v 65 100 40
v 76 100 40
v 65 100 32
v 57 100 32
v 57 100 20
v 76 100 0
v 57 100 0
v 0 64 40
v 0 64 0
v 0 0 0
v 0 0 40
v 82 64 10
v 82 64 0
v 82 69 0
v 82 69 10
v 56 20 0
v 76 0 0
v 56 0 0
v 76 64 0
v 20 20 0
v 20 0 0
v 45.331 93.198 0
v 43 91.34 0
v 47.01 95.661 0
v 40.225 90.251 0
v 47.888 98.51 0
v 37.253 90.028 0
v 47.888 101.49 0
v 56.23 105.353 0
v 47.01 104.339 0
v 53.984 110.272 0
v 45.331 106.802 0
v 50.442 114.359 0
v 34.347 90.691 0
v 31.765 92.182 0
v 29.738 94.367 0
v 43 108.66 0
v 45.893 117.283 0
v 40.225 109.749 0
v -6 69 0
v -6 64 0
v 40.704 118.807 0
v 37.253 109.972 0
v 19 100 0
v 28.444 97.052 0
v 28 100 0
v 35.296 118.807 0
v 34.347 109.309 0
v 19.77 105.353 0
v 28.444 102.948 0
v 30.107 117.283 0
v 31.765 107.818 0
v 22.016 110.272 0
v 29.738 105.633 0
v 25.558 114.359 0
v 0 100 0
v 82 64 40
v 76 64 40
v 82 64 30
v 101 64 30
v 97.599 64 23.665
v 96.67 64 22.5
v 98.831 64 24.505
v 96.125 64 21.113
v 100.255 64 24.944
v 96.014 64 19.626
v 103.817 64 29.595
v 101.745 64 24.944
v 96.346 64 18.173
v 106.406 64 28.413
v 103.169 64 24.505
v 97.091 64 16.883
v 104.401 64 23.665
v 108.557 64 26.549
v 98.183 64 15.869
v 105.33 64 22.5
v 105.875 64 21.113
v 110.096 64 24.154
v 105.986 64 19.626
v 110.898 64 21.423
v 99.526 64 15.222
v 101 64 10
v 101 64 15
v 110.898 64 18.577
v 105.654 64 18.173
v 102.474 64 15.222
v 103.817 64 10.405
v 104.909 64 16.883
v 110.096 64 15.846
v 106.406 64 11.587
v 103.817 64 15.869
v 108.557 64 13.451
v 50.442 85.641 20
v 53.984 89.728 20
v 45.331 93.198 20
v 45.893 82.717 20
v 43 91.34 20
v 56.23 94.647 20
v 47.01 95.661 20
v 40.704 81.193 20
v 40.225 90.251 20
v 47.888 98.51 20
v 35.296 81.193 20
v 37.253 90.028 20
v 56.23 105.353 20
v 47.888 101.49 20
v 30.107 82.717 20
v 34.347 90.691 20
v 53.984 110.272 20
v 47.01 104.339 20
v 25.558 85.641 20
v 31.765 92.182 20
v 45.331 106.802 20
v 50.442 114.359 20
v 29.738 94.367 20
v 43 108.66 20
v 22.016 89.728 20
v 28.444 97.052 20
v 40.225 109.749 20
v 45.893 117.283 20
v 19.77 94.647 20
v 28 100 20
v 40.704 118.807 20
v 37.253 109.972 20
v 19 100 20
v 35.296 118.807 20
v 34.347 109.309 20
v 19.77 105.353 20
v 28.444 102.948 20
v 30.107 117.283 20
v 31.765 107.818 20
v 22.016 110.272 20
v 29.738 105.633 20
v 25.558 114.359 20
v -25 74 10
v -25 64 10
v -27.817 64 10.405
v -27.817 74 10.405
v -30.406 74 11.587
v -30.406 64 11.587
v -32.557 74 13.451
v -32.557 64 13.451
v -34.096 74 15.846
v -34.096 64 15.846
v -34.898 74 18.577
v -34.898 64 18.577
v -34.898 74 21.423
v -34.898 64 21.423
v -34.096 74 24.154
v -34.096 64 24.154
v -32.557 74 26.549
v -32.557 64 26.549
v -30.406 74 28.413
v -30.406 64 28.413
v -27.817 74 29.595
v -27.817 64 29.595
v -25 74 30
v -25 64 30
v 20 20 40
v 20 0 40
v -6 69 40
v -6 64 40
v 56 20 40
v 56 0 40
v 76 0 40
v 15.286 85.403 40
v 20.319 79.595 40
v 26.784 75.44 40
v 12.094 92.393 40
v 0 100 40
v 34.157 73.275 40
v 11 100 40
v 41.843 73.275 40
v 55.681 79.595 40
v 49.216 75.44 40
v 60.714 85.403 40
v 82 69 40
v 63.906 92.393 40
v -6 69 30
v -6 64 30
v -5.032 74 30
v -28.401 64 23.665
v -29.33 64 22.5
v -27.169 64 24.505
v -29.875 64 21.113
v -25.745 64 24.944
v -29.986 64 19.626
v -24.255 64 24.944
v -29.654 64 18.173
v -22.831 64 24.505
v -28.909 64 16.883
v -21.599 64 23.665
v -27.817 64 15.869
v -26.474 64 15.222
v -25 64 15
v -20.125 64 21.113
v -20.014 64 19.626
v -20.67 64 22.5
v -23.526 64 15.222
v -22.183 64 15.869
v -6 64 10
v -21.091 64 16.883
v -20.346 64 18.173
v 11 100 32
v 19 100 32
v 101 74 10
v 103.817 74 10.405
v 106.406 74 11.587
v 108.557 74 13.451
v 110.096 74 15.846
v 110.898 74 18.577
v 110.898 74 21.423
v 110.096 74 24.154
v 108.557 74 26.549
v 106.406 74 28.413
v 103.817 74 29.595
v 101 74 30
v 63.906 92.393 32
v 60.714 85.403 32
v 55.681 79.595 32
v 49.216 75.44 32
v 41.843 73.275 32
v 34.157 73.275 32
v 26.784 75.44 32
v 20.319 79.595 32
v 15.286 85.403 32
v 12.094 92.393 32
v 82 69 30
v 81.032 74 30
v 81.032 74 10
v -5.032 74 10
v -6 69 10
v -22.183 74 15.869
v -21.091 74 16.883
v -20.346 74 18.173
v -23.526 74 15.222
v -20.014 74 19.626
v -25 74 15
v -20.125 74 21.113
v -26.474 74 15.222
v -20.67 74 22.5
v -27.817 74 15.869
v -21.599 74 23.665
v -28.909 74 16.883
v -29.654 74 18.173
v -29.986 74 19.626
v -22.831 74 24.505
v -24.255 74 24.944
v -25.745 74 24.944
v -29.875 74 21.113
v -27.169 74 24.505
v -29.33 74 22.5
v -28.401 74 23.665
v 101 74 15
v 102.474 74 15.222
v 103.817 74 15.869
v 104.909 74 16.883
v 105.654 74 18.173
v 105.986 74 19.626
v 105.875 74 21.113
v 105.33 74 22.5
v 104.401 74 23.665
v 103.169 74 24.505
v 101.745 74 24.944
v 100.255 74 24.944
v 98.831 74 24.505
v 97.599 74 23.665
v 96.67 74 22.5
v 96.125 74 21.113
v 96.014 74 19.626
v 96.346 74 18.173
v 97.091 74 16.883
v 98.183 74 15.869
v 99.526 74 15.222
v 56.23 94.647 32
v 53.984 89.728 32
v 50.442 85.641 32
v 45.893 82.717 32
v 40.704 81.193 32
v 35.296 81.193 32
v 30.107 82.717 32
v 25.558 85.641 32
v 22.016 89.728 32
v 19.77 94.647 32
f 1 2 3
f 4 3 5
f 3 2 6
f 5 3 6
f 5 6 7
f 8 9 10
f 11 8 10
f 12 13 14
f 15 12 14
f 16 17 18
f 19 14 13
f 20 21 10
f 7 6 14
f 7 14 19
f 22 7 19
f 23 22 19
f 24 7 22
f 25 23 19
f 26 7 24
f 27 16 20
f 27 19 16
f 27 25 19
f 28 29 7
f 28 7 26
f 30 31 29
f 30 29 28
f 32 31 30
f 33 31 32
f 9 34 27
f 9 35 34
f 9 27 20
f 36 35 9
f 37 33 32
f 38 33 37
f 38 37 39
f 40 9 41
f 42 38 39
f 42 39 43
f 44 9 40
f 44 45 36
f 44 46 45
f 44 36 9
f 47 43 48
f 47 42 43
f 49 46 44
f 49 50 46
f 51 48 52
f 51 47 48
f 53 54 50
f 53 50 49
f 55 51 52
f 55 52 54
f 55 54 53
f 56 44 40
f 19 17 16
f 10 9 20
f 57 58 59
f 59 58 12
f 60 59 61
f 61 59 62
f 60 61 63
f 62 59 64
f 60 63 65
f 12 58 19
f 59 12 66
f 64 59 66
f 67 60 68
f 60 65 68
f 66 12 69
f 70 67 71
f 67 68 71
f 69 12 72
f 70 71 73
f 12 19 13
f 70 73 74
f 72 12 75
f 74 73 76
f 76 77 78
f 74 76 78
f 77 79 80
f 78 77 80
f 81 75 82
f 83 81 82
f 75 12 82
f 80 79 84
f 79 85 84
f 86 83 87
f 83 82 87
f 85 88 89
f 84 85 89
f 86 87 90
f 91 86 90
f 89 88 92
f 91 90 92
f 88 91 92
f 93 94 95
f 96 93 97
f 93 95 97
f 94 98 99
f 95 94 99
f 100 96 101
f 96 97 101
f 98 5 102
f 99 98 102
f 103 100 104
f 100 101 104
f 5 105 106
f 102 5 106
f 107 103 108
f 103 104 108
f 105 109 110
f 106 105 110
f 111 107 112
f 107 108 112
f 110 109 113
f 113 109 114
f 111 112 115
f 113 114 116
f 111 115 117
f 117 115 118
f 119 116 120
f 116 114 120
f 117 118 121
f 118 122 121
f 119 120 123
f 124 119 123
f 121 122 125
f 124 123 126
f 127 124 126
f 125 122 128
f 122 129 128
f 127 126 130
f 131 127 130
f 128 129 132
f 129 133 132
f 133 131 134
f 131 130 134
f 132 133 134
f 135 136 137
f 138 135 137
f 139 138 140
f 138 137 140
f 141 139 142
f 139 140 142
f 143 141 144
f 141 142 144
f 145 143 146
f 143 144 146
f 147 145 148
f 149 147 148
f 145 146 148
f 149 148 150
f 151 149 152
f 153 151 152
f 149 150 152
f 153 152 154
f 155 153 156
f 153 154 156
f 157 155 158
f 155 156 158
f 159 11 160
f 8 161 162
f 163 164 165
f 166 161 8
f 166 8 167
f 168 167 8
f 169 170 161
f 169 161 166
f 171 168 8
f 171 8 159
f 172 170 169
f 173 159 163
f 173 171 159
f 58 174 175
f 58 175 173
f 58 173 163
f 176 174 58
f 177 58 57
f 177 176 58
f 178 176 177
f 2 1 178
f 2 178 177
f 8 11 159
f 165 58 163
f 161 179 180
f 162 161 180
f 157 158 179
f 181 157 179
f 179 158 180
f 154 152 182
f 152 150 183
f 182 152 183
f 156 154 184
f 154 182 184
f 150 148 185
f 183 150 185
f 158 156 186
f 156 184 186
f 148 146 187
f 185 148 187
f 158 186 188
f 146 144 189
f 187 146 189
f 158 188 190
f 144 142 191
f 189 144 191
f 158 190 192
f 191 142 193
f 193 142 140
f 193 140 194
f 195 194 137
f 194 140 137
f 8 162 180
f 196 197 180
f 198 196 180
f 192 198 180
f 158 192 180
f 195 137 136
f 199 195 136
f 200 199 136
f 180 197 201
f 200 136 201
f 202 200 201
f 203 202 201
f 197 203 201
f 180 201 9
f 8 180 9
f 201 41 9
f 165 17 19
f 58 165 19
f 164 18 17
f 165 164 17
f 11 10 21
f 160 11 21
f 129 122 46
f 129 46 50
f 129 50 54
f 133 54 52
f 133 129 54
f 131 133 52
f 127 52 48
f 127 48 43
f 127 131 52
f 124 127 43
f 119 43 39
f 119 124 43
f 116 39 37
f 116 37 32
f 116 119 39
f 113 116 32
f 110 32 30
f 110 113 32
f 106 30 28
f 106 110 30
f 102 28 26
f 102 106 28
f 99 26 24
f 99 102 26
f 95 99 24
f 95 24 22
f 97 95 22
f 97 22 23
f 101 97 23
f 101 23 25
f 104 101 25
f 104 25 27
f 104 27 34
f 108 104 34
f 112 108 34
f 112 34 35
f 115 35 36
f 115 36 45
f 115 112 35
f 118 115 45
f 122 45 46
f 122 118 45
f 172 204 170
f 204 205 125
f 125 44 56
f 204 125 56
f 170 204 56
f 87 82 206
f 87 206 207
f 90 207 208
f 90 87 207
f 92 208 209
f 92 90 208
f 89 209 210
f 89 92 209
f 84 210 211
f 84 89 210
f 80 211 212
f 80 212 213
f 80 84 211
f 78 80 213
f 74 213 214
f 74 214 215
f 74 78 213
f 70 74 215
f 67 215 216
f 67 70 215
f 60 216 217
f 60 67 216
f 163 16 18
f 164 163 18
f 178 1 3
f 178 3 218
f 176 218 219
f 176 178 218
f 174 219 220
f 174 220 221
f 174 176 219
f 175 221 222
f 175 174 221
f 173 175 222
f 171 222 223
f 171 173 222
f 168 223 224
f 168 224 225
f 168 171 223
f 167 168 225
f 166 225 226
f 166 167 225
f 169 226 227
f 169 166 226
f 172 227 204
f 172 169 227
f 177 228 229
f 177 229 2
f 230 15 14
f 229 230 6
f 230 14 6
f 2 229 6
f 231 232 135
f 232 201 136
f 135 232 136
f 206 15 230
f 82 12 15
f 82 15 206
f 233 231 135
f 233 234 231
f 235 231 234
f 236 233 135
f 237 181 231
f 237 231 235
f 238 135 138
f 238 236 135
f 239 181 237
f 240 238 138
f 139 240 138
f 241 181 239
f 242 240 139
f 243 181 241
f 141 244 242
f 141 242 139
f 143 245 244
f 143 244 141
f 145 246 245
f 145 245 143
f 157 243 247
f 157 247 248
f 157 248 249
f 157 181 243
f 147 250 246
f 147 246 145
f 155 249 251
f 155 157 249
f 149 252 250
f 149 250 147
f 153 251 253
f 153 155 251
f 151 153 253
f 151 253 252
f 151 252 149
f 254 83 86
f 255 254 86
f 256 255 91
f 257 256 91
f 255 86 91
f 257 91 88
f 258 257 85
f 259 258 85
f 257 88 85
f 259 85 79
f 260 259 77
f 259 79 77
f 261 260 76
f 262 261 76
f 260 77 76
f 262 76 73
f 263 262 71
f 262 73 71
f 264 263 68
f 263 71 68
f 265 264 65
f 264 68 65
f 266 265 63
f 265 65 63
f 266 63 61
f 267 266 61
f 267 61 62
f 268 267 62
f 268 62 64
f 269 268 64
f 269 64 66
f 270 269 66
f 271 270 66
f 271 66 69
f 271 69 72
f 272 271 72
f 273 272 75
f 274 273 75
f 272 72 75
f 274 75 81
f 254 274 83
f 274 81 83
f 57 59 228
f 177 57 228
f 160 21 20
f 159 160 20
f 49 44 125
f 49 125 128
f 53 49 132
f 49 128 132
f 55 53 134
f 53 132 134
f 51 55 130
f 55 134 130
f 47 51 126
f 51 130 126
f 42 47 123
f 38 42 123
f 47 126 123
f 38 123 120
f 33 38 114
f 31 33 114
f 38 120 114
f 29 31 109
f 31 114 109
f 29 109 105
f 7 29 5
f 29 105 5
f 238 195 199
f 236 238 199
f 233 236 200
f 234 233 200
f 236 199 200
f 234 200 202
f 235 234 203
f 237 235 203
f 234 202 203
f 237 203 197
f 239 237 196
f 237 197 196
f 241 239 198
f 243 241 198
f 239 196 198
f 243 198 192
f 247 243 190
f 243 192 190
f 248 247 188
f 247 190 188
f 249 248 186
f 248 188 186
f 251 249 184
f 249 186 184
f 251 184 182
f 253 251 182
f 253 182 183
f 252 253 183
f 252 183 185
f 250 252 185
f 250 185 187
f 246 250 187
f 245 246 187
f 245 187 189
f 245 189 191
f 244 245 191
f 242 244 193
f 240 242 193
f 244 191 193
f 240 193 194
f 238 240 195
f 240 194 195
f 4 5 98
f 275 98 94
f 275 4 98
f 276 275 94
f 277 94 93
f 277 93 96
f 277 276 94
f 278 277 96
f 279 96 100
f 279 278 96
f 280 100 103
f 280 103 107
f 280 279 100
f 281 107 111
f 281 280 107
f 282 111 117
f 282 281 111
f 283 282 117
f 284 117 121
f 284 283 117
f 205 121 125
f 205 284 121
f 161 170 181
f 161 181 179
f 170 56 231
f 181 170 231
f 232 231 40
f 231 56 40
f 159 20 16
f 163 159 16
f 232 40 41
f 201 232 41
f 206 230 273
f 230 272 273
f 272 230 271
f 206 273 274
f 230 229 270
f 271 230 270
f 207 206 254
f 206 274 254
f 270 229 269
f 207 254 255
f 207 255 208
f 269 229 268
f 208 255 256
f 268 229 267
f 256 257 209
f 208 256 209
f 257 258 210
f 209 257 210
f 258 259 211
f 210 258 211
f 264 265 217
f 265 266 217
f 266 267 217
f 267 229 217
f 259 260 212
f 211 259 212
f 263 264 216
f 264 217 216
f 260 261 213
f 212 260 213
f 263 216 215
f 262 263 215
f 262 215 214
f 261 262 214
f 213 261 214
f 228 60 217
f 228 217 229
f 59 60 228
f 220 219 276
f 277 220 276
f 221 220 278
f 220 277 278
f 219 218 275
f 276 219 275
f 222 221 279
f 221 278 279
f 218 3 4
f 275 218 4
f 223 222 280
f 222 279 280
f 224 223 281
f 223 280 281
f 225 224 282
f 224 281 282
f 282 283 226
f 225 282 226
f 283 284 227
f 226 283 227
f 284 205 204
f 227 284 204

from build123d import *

# Parameters (mm, degrees)
BOSS_EXTRUDE1_DEPTH = 40
CUT_EXTRUDE1_DEPTH  = 8
CUT_EXTRUDE2_DEPTH  = 134.221619867
BOSS_EXTRUDE2_START = -20
SKETCH5_R           = 19
SKETCH5_R_2         = 10
BOSS_EXTRUDE2_DEPTH = 20
SKETCH6_R           = 5
BOSS_EXTRUDE3_DEPTH = 10
SKETCH7_R           = 5
BOSS_EXTRUDE4_DEPTH = 10


with BuildPart() as part:
    # Sketch1 → Boss-Extrude1 (new body)
    with BuildSketch(Plane.XY):
        Polygon((0, 0), (20, 0), (20, 20), (56, 20), (56, 0), (76, 0), (76, 64), (82, 64), (82, 69), (76, 100), (0, 100), (-6, 69), (-6, 64), (0, 64), align=None)
    extrude(amount=BOSS_EXTRUDE1_DEPTH)

    # Sketch2 → Cut-Extrude1 (cut)
    with BuildSketch(Plane.XY.offset(40)):
        with BuildLine():
            Line((11, 100), (65, 100))
            ThreePointArc((65, 100), (38, 73), (11, 100))
        make_face()
    extrude(amount=-CUT_EXTRUDE1_DEPTH, mode=Mode.SUBTRACT)

    # Sketch4 → Cut-Extrude2 (cut, through all)
    with BuildSketch(Plane.XY.offset(32)):
        with BuildLine():
            Line((19, 100), (57, 100))
            ThreePointArc((57, 100), (38, 81), (19, 100))
        make_face()
    extrude(amount=-CUT_EXTRUDE2_DEPTH, mode=Mode.SUBTRACT)

    # Sketch5 → Boss-Extrude2 (add)
    with BuildSketch(Plane(origin=(0, 0, 0), x_dir=(-1, 0, 0), z_dir=(0, 0, -1)).offset(BOSS_EXTRUDE2_START)):
        with Locations((-38, 100)):
            Circle(SKETCH5_R)
        with Locations((-38, 100)):
            Circle(SKETCH5_R_2, mode=Mode.SUBTRACT)
    extrude(amount=BOSS_EXTRUDE2_DEPTH)

    # Sketch6 → Boss-Extrude3 (add)
    with BuildSketch(Plane.XZ.offset(-64)):
        with BuildLine():
            Line((-3.1710474, 30), (-3.1710474, 10))
            Line((-3.1710474, 10), (-25, 10))
            ThreePointArc((-25, 10), (-35, 20), (-25, 30))
            Line((-25, 30), (-3.1710474, 30))
        make_face()
        with Locations(Location((-25, 20, 0), (0, 0, 270))):
            Circle(SKETCH6_R, mode=Mode.SUBTRACT)
    extrude(amount=-BOSS_EXTRUDE3_DEPTH)

    # Sketch7 → Boss-Extrude4 (add)
    with BuildSketch(Plane.XZ.offset(-64)):
        with BuildLine():
            Line((78.953464746, 30), (78.953464746, 10))
            Line((78.953464746, 10), (101, 10))
            ThreePointArc((101, 10), (111, 20), (101, 30))
            Line((101, 30), (78.953464746, 30))
        make_face()
        with Locations(Location((101, 20, 0), (0, 0, 270))):
            Circle(SKETCH7_R, mode=Mode.SUBTRACT)
    extrude(amount=-BOSS_EXTRUDE4_DEPTH)


solid = part.part
